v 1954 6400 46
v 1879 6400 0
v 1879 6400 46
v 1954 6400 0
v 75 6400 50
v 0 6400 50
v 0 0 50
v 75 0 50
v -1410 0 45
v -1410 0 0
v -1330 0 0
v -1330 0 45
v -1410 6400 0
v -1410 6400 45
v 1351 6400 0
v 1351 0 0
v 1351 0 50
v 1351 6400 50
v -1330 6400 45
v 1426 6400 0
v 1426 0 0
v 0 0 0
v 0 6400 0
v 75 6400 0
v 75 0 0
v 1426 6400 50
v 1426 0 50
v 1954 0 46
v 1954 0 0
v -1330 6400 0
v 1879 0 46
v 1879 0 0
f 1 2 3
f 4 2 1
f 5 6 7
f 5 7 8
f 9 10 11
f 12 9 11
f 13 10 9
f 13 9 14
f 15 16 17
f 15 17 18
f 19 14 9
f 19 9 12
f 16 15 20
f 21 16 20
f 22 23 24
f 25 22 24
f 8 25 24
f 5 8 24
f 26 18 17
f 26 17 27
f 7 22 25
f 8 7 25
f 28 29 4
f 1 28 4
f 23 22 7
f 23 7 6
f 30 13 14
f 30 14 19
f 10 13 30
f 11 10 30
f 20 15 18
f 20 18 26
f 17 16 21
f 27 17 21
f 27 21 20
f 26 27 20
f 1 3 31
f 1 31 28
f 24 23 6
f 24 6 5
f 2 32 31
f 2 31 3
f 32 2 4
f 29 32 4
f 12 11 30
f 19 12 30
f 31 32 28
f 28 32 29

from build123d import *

# Parameters (mm, degrees)
F0_W     = 75
F0_H     = 6400
F1_DEPTH = 46
F2_DEPTH = 50
F3_DEPTH = 50
F0_W_2   = 80
F4_DEPTH = 45


with BuildPart() as f1:
    # F0 (on Top) → F1 (new body)
    with BuildSketch(Plane.XY):
        with Locations((1916.5, 3200)):
            Rectangle(F0_W, F0_H)
    extrude(amount=F1_DEPTH)


with BuildPart() as f2:
    # F0 (on Top) → F2 (new body)
    with BuildSketch(Plane.XY):
        with Locations((1388.5, 3200)):
            Rectangle(F0_W, F0_H)
    extrude(amount=F2_DEPTH)


with BuildPart() as f3:
    # F0 (on Top) → F3 (new body)
    with BuildSketch(Plane.XY):
        with Locations((37.5, 3200)):
            Rectangle(F0_W, F0_H)
    extrude(amount=F3_DEPTH)


with BuildPart() as f4:
    # F0 (on Top) → F4 (new body)
    with BuildSketch(Plane.XY):
        with Locations((-1370, 3200)):
            Rectangle(F0_W_2, F0_H)
    extrude(amount=F4_DEPTH)


solid = Compound([f1.part, f2.part, f3.part, f4.part])
